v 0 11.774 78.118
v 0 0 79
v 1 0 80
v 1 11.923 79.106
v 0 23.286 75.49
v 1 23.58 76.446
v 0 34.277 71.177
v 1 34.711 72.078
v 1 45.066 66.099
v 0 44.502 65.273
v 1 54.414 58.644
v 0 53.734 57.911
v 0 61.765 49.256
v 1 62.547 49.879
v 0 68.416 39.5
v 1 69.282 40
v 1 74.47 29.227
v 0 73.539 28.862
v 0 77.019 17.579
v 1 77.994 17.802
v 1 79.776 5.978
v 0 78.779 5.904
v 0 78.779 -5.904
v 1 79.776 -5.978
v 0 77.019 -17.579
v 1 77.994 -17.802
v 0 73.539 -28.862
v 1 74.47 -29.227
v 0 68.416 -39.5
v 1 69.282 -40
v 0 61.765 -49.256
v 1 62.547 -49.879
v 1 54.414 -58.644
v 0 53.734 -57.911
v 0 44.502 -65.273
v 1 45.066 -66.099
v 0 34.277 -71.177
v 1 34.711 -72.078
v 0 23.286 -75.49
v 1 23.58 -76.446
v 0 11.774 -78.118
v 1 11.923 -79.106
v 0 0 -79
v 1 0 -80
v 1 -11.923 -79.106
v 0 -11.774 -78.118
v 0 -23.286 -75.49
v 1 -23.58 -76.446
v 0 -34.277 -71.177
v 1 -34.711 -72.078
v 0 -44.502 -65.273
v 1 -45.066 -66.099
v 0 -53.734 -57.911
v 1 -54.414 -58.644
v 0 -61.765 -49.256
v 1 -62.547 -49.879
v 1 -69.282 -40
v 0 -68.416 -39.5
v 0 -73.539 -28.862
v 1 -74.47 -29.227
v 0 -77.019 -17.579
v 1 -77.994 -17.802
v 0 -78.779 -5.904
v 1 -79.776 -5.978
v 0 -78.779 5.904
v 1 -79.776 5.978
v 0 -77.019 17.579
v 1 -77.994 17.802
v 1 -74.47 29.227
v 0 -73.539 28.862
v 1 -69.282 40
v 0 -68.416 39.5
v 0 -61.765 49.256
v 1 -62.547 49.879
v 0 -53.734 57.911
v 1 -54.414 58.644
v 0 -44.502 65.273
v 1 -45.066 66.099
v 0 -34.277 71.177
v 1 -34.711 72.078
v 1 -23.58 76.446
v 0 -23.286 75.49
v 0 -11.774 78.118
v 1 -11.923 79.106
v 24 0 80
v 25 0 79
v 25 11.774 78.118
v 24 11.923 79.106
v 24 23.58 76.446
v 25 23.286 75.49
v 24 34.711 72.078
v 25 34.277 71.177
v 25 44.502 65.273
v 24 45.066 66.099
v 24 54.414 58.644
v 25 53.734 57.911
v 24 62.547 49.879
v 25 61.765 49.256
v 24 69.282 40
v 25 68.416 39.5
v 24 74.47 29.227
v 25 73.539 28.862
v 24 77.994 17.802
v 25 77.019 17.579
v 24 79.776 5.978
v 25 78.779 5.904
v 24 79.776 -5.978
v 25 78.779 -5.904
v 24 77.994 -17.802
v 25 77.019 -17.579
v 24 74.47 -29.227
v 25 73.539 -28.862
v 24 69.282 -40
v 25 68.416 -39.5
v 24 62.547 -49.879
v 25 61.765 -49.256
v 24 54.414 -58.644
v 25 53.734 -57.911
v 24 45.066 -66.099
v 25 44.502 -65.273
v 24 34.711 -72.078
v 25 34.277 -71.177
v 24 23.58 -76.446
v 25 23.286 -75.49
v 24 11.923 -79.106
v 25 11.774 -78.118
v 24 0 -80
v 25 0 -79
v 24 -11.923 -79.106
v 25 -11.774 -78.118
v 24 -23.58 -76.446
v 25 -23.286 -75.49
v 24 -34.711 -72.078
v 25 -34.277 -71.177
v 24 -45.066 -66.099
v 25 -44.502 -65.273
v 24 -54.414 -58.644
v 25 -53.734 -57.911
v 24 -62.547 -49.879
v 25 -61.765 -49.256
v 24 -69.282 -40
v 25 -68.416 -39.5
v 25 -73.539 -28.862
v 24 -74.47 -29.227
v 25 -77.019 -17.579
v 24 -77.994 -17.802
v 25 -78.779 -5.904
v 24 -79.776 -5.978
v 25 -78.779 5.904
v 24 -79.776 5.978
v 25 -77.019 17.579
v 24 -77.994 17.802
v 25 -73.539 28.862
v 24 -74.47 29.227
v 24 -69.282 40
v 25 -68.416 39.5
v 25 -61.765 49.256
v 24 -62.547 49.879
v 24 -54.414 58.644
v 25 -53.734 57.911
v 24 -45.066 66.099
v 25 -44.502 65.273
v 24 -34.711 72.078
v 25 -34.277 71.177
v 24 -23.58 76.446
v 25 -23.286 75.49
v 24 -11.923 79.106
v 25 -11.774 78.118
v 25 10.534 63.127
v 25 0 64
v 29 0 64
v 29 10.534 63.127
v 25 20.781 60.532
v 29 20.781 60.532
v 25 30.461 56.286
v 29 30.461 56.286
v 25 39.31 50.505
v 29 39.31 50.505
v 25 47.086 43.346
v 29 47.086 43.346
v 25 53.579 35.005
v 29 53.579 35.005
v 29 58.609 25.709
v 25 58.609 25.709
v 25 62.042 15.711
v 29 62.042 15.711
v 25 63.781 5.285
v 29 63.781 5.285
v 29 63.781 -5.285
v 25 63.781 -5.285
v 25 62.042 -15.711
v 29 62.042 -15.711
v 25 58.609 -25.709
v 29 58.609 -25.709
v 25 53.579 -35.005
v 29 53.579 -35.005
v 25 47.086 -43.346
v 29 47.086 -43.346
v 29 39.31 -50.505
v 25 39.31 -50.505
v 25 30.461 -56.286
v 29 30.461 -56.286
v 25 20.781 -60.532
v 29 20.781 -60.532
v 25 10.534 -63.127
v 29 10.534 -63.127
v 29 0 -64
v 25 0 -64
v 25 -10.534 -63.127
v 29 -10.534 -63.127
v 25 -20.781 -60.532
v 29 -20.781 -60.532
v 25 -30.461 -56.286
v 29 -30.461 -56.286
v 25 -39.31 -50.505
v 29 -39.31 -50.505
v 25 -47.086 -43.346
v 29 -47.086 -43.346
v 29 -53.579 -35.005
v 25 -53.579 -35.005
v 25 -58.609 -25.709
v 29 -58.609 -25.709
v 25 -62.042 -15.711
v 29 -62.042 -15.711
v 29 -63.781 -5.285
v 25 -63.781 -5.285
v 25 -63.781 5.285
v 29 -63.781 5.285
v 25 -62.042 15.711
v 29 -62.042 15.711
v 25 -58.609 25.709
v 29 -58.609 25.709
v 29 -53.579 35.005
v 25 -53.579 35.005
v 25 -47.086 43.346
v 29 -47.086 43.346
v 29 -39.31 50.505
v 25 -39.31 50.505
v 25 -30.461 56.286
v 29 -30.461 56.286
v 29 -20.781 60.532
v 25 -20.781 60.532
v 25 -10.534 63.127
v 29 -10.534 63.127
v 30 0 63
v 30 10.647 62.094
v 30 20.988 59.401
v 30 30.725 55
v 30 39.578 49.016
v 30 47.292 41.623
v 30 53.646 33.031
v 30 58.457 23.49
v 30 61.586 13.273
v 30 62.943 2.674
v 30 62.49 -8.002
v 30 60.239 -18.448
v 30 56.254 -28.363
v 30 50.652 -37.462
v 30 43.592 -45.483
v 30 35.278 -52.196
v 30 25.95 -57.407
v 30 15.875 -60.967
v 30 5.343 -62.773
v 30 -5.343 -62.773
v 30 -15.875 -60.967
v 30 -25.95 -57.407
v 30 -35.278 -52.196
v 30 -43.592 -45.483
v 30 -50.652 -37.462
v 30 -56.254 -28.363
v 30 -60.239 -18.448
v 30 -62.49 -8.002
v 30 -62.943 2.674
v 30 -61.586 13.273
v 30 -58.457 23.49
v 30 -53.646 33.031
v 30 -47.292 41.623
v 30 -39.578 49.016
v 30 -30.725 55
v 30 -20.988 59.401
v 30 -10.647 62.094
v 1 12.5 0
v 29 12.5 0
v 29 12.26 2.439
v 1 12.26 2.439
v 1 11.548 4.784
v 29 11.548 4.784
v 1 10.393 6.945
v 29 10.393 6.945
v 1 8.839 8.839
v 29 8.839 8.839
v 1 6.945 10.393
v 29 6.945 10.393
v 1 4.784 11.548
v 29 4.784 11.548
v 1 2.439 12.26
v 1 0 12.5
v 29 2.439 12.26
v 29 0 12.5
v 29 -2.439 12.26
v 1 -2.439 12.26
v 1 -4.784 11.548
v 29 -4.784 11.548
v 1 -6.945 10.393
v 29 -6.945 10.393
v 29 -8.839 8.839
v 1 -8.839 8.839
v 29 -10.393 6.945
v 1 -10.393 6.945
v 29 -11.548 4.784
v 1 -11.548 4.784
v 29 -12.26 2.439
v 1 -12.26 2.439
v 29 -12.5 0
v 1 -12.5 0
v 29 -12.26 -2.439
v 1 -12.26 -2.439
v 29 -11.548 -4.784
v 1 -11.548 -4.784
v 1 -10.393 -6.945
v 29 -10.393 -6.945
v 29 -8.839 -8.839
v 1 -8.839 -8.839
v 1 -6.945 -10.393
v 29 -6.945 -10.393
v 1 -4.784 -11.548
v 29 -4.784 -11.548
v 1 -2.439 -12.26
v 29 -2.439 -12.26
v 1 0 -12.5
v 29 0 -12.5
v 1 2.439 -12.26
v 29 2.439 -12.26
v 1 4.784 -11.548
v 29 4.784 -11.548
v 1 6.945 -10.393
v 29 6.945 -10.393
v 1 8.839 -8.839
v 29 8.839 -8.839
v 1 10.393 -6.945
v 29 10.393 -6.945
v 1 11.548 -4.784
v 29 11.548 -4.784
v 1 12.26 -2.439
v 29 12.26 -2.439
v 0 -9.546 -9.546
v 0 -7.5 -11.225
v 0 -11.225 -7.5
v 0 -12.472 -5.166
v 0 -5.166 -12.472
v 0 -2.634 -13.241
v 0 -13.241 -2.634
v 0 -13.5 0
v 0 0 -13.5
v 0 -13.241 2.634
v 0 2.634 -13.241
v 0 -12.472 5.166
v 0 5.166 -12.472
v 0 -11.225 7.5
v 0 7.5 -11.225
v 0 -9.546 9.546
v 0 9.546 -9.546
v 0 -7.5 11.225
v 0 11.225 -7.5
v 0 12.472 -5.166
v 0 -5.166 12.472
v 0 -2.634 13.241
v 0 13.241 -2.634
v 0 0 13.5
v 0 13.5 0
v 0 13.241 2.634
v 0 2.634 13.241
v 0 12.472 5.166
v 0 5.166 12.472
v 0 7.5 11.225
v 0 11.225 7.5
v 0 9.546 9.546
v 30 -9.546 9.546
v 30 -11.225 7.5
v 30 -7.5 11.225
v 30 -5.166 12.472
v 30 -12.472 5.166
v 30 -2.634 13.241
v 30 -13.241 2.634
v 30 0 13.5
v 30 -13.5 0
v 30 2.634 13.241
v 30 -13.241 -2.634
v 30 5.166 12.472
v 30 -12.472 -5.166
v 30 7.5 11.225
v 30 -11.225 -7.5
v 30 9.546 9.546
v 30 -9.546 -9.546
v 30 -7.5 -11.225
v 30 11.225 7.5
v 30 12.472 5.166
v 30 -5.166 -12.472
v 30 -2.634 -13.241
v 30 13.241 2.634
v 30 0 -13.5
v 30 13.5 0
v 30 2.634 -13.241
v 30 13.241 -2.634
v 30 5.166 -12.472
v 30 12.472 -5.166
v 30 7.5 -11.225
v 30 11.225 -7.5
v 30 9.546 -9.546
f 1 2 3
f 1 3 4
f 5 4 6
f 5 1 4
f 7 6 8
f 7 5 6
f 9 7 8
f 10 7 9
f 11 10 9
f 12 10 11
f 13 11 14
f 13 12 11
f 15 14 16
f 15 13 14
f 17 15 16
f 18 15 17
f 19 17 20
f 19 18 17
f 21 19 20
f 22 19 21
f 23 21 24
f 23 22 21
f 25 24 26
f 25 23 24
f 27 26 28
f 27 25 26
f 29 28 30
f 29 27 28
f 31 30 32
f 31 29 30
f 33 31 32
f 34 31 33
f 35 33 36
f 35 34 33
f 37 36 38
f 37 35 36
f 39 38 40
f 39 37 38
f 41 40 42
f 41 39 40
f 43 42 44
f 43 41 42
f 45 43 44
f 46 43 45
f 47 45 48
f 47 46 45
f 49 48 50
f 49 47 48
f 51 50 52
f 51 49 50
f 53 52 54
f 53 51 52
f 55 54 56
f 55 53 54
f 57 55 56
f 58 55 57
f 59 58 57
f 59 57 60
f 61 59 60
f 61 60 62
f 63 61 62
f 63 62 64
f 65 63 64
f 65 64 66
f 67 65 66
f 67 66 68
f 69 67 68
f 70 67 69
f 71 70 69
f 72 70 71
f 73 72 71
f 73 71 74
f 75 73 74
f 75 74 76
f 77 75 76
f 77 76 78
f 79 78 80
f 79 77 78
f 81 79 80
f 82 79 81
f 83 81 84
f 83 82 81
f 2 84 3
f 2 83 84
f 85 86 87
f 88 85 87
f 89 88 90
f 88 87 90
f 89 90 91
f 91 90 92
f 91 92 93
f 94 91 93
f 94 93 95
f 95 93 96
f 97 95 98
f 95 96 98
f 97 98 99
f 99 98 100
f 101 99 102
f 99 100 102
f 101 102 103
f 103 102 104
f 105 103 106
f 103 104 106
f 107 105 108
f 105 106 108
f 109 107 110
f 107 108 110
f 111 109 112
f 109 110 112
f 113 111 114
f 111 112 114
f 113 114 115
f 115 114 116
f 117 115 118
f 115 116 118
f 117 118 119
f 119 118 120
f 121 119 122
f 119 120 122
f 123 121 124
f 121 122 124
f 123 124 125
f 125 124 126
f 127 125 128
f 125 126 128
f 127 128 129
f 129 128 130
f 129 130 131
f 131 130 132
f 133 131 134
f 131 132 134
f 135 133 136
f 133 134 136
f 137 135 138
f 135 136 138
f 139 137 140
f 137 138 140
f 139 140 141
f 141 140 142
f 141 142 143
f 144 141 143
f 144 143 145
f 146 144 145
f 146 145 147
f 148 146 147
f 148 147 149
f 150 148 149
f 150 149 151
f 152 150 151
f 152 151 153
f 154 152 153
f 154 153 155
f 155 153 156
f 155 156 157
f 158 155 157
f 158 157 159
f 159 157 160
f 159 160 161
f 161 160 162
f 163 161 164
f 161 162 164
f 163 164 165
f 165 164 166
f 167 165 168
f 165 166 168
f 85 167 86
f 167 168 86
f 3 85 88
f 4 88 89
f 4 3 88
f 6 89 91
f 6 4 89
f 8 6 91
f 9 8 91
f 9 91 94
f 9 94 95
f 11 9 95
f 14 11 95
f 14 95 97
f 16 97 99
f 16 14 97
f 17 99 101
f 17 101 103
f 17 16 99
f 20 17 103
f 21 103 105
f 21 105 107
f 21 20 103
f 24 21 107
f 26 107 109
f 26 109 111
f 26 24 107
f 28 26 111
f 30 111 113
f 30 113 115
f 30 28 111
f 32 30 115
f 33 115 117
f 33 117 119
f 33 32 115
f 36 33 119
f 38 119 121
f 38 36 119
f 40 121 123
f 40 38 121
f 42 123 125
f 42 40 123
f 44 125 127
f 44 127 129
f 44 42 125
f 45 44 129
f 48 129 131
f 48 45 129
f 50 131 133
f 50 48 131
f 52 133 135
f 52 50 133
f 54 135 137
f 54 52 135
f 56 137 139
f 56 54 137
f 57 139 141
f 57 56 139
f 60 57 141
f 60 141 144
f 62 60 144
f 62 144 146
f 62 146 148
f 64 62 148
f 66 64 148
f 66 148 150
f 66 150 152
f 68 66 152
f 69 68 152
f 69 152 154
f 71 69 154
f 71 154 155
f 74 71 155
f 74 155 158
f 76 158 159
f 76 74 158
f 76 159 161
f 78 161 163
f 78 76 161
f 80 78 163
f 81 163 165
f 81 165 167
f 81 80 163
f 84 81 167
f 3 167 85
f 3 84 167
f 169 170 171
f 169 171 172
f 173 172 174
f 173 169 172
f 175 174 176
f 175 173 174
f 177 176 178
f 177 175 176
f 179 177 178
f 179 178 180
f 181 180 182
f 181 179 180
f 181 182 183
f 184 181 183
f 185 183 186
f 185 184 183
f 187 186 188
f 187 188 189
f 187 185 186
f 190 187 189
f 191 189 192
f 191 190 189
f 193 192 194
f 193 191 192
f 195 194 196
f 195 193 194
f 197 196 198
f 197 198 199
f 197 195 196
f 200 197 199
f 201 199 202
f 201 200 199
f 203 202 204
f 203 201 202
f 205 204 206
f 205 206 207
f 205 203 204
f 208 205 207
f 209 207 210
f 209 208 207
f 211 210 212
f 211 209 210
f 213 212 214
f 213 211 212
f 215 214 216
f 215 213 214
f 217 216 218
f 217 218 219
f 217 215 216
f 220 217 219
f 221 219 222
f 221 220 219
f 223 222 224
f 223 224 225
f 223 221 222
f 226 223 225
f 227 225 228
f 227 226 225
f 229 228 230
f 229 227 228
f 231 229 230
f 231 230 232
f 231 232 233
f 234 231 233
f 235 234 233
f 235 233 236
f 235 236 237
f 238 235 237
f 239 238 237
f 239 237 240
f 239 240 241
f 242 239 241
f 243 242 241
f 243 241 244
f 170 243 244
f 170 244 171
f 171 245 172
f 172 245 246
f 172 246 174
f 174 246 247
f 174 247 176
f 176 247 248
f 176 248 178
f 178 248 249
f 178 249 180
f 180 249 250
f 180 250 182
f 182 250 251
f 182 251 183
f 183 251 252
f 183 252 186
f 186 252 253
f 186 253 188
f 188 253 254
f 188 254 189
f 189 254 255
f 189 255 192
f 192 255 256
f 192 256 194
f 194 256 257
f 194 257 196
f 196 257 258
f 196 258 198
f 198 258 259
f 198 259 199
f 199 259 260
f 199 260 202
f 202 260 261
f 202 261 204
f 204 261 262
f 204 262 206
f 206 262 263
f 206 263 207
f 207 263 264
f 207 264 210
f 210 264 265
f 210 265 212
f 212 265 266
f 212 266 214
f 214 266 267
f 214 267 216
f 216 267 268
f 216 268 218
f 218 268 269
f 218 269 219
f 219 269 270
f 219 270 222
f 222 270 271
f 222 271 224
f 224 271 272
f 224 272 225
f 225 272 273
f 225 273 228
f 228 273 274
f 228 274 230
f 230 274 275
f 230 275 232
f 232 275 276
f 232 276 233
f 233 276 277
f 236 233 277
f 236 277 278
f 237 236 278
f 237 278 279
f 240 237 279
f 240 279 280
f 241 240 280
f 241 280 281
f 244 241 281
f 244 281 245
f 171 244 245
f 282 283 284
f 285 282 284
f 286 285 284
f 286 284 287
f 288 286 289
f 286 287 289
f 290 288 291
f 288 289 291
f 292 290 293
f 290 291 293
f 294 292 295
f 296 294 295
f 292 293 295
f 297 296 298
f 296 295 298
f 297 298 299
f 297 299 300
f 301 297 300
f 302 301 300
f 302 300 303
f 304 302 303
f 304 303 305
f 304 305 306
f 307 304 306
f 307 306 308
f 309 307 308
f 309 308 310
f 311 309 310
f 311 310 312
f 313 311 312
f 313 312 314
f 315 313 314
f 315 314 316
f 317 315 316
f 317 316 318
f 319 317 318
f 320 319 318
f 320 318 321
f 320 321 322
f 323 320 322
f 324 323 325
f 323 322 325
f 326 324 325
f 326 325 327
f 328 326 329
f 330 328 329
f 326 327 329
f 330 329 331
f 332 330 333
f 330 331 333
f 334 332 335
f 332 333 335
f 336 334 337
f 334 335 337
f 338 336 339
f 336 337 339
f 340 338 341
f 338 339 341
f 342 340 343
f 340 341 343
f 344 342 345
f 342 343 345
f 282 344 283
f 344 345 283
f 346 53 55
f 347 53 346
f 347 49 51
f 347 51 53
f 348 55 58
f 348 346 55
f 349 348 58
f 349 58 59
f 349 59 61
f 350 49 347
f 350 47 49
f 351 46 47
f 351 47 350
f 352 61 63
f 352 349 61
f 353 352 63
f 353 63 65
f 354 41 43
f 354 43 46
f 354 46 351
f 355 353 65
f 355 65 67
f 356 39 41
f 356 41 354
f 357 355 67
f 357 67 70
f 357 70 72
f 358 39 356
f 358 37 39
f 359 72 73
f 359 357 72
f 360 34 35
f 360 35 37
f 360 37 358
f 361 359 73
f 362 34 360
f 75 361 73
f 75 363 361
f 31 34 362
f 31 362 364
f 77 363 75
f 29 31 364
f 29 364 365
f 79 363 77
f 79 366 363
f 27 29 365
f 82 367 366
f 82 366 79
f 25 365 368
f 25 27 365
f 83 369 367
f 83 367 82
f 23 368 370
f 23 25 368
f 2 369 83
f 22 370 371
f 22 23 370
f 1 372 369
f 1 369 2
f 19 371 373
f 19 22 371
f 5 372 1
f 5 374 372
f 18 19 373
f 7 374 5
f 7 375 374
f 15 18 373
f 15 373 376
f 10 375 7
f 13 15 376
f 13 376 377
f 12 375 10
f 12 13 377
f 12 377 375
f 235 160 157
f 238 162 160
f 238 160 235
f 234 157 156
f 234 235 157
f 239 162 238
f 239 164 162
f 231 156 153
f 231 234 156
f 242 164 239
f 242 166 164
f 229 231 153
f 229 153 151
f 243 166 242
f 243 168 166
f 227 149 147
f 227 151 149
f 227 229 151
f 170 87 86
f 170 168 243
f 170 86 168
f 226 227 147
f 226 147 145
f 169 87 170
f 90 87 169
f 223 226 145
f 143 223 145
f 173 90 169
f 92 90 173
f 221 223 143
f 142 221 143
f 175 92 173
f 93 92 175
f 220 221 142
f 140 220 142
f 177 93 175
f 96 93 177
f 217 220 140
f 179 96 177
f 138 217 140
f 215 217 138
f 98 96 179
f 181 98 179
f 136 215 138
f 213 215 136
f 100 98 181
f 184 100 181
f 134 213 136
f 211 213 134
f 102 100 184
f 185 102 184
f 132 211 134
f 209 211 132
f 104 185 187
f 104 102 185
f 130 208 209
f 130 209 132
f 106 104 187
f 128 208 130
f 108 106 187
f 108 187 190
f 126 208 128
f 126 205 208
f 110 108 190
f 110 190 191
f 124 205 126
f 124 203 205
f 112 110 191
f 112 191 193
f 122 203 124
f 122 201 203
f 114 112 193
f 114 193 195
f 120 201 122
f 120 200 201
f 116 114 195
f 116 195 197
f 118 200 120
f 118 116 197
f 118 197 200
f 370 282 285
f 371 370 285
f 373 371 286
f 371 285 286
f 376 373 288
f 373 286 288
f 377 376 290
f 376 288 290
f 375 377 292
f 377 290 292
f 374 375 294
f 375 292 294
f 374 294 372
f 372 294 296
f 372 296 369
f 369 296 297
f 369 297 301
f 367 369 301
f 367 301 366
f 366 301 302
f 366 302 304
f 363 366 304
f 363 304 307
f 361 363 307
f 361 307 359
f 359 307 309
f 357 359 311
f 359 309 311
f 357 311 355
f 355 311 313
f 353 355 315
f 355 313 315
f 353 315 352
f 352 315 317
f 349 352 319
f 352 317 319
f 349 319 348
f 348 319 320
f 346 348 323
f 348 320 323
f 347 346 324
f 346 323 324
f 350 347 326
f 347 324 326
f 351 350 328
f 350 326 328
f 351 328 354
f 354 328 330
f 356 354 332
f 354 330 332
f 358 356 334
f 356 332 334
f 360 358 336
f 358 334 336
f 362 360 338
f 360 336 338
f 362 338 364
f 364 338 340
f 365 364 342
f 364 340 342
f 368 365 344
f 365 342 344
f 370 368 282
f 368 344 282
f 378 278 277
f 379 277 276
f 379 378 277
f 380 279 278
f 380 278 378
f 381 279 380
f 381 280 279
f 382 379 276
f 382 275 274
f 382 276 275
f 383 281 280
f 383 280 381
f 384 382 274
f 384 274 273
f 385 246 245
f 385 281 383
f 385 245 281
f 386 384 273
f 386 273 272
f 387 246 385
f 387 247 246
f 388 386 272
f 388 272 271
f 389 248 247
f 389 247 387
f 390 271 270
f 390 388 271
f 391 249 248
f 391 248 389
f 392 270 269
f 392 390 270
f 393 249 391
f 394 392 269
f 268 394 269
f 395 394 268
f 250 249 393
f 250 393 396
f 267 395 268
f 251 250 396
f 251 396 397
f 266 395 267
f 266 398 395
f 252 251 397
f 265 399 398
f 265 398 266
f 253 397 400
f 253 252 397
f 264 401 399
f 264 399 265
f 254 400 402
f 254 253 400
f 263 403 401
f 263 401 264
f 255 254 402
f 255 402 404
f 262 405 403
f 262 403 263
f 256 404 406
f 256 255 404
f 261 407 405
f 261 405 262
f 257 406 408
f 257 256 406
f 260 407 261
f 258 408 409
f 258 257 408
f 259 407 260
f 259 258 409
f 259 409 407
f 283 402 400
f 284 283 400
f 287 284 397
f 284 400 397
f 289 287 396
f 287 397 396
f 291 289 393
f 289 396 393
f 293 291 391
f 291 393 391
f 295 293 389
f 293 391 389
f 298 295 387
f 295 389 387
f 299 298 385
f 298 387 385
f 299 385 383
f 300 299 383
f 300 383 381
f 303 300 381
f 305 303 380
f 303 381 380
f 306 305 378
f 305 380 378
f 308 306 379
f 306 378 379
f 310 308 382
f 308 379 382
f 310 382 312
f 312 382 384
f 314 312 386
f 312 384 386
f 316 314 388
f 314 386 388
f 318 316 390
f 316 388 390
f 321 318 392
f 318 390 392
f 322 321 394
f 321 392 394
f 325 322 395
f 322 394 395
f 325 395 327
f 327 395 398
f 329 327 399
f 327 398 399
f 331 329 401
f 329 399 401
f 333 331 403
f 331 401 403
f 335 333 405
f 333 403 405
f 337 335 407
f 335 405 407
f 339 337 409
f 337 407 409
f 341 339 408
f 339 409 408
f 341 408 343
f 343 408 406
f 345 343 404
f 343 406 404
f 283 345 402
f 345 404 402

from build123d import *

# Parameters (mm, degrees)
F2_R     = 12.5
F3_DEPTH = 40
F4_SIZE  = 1


with BuildPart() as f1:
    # F0 (on Front) → F1 (revolve)
    with BuildSketch(Plane.XZ):
        Polygon((25, 80), (0, 80), (0, 0), (30, 0), (30, 64), (25, 64), align=None)
    revolve(axis=Axis((15, 0, 0), (-1, 0, 0)))

    # F2 (on face) → F3 (cut)
    with BuildSketch(Plane.YZ.offset(30)):
        Circle(F2_R)
    extrude(amount=-F3_DEPTH, mode=Mode.SUBTRACT)

    # F4
    f4_edges = [f1.edges().sort_by_distance(p)[0] for p in [
        (30, 0, -64),
        (30, -12.5, 0),
        (25, 0, -80),
        (0, 0, -80),
        (0, -12.5, 0),
    ]]
    chamfer(f4_edges, length=F4_SIZE)


solid = f1.part
